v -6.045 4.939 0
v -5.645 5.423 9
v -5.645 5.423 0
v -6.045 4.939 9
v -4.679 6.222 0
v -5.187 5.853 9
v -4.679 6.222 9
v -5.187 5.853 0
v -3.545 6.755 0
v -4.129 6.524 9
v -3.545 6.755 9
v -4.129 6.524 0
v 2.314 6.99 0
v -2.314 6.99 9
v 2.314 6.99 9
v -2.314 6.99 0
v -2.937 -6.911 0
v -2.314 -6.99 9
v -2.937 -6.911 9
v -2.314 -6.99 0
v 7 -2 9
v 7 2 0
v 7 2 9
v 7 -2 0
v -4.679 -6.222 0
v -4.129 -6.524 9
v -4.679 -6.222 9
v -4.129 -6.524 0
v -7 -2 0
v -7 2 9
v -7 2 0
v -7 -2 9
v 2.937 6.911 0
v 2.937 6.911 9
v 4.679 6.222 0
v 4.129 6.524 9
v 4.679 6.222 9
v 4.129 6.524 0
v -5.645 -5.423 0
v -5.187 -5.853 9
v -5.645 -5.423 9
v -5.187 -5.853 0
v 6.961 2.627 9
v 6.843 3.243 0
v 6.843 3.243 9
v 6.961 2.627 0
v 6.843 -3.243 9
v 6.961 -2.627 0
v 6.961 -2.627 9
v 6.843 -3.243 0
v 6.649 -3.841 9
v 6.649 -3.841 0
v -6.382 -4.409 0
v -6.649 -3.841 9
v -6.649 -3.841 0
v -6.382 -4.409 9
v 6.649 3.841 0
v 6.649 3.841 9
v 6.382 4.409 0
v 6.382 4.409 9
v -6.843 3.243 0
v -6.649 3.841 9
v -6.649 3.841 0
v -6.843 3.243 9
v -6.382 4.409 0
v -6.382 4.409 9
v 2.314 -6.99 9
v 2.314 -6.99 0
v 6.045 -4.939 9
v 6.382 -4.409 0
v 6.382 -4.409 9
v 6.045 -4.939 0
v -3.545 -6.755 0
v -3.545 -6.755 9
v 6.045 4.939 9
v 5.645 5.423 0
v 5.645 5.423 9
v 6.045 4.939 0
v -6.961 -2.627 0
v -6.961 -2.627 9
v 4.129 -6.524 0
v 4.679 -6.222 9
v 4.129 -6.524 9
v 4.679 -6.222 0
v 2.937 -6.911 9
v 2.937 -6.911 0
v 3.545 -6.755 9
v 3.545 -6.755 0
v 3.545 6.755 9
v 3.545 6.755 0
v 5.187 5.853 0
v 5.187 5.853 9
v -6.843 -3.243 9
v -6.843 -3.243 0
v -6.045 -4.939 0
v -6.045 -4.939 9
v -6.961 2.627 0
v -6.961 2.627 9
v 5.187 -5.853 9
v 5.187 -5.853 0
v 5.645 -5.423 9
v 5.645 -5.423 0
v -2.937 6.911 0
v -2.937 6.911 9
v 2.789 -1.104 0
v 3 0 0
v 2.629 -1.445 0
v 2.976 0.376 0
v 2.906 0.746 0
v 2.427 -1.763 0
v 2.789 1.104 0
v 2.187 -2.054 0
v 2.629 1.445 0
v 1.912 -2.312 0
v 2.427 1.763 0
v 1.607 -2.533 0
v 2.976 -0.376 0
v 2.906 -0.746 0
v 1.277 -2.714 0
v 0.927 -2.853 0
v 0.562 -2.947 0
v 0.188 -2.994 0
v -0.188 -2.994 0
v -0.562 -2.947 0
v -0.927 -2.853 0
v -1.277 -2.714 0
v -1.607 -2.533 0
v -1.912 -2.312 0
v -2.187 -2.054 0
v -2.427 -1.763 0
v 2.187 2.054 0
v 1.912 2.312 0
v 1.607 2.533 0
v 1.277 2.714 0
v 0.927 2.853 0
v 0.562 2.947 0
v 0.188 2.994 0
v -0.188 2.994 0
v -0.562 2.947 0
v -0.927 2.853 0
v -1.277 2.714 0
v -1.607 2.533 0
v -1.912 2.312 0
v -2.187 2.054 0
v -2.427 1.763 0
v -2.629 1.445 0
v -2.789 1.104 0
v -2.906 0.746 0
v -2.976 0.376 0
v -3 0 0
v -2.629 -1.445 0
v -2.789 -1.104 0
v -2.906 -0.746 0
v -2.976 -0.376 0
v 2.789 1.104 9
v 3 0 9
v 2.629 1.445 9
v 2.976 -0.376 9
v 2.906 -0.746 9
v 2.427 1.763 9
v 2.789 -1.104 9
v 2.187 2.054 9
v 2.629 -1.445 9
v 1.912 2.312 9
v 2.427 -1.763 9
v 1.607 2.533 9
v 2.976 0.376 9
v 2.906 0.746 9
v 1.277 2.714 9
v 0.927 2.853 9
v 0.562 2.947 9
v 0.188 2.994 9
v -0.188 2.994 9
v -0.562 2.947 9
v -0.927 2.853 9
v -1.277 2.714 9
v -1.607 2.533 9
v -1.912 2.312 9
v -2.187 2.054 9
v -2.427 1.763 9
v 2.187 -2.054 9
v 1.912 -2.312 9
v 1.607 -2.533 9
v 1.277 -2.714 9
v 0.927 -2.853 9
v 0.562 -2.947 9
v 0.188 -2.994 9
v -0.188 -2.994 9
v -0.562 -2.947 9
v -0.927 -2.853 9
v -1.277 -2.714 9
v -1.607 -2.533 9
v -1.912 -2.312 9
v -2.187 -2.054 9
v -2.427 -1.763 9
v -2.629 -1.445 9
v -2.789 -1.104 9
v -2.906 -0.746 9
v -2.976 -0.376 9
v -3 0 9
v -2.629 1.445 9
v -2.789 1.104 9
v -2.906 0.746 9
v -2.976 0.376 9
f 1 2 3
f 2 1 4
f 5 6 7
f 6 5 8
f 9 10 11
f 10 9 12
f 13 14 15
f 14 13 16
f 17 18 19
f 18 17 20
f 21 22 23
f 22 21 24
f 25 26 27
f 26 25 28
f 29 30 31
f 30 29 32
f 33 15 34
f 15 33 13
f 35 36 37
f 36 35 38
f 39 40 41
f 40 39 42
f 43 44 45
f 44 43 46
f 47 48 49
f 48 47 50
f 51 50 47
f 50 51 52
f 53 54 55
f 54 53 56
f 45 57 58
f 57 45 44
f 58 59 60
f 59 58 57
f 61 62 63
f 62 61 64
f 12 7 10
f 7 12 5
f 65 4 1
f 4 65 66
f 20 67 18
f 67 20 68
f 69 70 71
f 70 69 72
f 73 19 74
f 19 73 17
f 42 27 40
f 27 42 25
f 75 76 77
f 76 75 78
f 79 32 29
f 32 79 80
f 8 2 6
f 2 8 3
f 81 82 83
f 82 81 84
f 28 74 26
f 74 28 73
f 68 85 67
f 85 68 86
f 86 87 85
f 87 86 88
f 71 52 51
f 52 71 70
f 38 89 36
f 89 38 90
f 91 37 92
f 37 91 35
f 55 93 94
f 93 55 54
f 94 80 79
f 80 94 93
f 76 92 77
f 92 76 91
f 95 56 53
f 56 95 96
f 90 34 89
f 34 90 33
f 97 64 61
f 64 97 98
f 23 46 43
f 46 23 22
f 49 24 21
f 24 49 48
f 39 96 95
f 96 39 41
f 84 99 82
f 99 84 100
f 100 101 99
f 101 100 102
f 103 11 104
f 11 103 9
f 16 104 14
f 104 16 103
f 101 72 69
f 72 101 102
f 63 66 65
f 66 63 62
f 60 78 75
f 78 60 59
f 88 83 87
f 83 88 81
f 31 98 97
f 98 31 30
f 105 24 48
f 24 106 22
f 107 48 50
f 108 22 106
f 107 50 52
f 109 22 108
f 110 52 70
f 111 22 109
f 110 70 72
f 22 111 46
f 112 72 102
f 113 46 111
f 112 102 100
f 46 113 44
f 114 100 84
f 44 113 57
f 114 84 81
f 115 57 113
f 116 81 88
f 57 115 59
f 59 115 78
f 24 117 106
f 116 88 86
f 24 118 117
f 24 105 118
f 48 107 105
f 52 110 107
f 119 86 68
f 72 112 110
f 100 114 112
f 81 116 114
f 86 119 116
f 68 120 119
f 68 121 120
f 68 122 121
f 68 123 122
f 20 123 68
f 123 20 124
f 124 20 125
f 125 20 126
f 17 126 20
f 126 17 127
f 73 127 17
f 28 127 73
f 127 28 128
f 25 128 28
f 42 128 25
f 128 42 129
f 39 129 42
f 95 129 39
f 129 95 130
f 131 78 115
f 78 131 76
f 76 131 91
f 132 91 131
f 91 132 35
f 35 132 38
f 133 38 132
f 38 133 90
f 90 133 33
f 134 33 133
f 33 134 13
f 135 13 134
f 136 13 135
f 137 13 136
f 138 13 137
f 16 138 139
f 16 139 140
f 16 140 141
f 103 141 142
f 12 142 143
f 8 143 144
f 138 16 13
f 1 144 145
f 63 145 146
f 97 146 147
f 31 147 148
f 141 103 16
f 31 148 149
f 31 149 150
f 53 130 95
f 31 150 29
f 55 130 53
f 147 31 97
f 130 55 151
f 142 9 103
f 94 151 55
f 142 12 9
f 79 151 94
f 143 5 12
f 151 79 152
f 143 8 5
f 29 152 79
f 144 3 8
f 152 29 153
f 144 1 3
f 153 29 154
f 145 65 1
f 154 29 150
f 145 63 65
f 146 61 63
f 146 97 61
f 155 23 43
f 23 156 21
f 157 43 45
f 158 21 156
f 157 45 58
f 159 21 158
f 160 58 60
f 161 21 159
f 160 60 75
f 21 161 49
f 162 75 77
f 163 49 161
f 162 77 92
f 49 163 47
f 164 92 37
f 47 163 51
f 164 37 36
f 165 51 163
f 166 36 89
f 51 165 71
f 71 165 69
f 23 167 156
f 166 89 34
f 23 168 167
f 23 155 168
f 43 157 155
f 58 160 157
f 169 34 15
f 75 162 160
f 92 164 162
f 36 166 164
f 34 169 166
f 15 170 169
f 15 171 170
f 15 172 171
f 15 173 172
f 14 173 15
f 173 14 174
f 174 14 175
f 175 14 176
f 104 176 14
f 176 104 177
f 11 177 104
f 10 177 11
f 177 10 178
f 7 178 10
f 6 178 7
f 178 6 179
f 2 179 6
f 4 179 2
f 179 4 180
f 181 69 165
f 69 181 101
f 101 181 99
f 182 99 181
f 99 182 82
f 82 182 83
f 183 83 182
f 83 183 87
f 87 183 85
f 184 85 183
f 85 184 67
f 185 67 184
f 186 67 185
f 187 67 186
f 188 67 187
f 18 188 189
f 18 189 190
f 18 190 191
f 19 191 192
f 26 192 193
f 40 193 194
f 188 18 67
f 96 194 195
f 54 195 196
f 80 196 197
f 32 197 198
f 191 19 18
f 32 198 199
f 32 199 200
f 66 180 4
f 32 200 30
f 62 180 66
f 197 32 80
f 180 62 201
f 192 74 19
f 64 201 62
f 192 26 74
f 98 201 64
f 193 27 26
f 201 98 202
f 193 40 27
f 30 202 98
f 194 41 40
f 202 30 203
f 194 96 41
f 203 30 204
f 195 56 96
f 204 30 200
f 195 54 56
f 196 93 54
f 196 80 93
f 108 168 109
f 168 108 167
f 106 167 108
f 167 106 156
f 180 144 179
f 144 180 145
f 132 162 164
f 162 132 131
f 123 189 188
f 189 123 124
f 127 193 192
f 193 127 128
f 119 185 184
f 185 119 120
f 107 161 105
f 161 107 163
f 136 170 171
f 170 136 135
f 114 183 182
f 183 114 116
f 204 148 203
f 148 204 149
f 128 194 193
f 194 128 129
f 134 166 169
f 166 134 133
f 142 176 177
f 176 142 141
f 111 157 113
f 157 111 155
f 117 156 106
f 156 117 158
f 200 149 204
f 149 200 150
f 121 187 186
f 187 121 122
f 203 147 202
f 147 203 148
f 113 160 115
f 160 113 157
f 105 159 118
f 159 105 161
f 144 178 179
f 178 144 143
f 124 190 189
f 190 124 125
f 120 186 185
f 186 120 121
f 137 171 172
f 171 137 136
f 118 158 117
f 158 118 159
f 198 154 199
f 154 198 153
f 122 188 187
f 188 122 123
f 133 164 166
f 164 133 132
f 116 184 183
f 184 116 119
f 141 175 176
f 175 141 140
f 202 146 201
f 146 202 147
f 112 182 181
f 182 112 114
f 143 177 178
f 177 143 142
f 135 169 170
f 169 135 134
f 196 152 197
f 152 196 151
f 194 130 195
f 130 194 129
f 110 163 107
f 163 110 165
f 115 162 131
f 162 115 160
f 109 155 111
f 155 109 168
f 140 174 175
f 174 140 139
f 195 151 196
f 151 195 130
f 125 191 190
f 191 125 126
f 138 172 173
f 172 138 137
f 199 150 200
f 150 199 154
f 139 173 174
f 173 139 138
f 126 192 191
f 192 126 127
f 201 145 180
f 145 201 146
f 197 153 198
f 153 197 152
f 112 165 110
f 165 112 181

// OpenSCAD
// Generated by SolidPython 1.1.3 on 2023-03-12 22:43:45
$fn = 50;


difference() {
	union() {
		translate(v = [0, 0, 0]) {
			rotate(a = [0, 0, 0]) {
				hull() {
					translate(v = [-2.0000000000, 2.0000000000, 0]) {
						rotate(a = [0, 0, 0]) {
							translate(v = [0, 0, 0]) {
								rotate(a = [0, 0, 0]) {
									cylinder(h = 9, r = 5);
								}
							}
						}
					}
					translate(v = [2.0000000000, 2.0000000000, 0]) {
						rotate(a = [0, 0, 0]) {
							translate(v = [0, 0, 0]) {
								rotate(a = [0, 0, 0]) {
									cylinder(h = 9, r = 5);
								}
							}
						}
					}
					translate(v = [-2.0000000000, -2.0000000000, 0]) {
						rotate(a = [0, 0, 0]) {
							translate(v = [0, 0, 0]) {
								rotate(a = [0, 0, 0]) {
									cylinder(h = 9, r = 5);
								}
							}
						}
					}
					translate(v = [2.0000000000, -2.0000000000, 0]) {
						rotate(a = [0, 0, 0]) {
							translate(v = [0, 0, 0]) {
								rotate(a = [0, 0, 0]) {
									cylinder(h = 9, r = 5);
								}
							}
						}
					}
				}
			}
		}
	}
	union() {
		translate(v = [0.0000000000, 0.0000000000, 0]) {
			rotate(a = [0, 0, 0]) {
				translate(v = [0, 0, -50]) {
					rotate(a = [0, 0, 0]) {
						cylinder(h = 100, r = 3.0000000000);
					}
				}
			}
		}
	}
}
/***********************************************
*********      SolidPython code:      **********
************************************************
 
from solid import *
import os
import subprocess

import oomB

import opsc_library_gen

mode = "laser"
#mode = "3d_print"

defined_objects = {}

radius_dict = {}
countersunk_dict = {}


def set_mode(m):
    global mode
    mode = m
    radius_dict['M6'] = 6.5/2
    radius_dict['M3'] = 3.3/2
    if mode == "laser":
        radius_dict['M6'] = 6/2
        radius_dict['M3'] = 3/2

    countersunk_dict['M3'] = {}
    countersunk_dict['M3']['little_rad'] = radius_dict['M3']
    countersunk_dict['M3']['big_rad'] = (5.5+0.6)/2
    if mode == "laser":
        countersunk_dict['M3']['big_rad'] = (4.75+0.6)/2
        countersunk_dict['M3']['little_rad'] = (4.75+0.6)/2

    countersunk_dict['M3']['height'] = 1.7


def opsc_make_object(filename, objects, save_type="none",resolution=50, layers = 1, tilediff = 200, mode="laser", overwrite=True):
    if overwrite or not os.path.exists(filename):
        set_mode(mode)
        save_type = save_type.lower()
        os.makedirs(os.path.dirname(filename), exist_ok=True)
        final_object = opsc_get_object(objects, mode = mode)
        # Save the final object to the specified filename    
        scad_render_to_file(final_object, filename, file_header='$fn = %s;' % resolution, include_orig_code=True)
        if mode == "laser":
            filename_laser = filename.replace(".scad","-flat.scad")
            scad_render_to_file(getLaser(final_object, layers=layers, tilediff=tilediff), filename_laser, file_header='$fn = %s;' % resolution, include_orig_code=True)
            if save_type == "all":
                saveToAll(filename_laser)
            elif save_type == "dxf":
                saveToDxf(filename_laser)
        if save_type == "all":
            saveToAll(filename)
        elif save_type == "dxf":
            saveToDxf(filename)


def opsc_get_object(objects, mode = "laser"):
    # Create the solidpython objects only include the positive objects and if they don't have inclusion or their inclusion is either all or mode
    # Initialize an empty list to store the results
    positive_objects = []

    # Iterate over the "objects" list
    for obj in objects:
        # Check if the current object has a "type" key with a value of "positive"
        if obj['type'] == 'positive':
            # Check if the current object has an "inclusion" key and its value matches "mode",
            # or if the current object does not have an "inclusion" key at all
            if not 'inclusion' in obj or obj['inclusion'] == "all" or obj['inclusion'] == mode:
                # Call the "get_opsc_item" function with the current object as an argument
                opsc_item = get_opsc_item(obj)
                # Add the result to the "positive_objects" list
                positive_objects.append(opsc_item)
# Initialize an empty list to store the results
    negative_objects = []

    # Iterate over the "objects" list
    for obj in objects:
        # Check if the current object has a "type" key with a value of "negative"
        if obj['type'] == 'negative':
            # Check if the current object has an "inclusion" key and its value matches "mode",
            # or if the current object does not have an "inclusion" key at all
            if not 'inclusion' in obj or obj['inclusion'] == "all" or obj['inclusion'] == mode:
                # Call the "get_opsc_item" function with the current object as an argument
                opsc_item = get_opsc_item(obj)
                # Add the result to the "negative_objects" list
                negative_objects.append(opsc_item)
    
    #positive_objects = [get_opsc_item(obj) for obj in objects if obj['type'] == 'positive']
    #negative_objects = [get_opsc_item(obj) for obj in objects if obj['type'] == 'negative']
    # Union the positive objects
    positive_object = union()(*positive_objects)
    # Union the negative objects
    negative_object = union()(*negative_objects)
    # Create the final object by subtracting the negative objects from the positive objects
    return difference()(positive_object, negative_object)

def get_opsc_item(params):
    # A dictionary to map radius string values to numerical values
    #radius_dict = {'small': 5, 'medium': 10, 'large': 15}
    # An array of function names for basic shapes
    basic_shapes = ['cube', 'sphere', 'cylinder']
    
    # An array of function names for other shapes
    other_shapes = ['hole', 'slot', 'rounded_rectangle', 'countersunk']
    


    # Convert radius to r if present, and remove radius from the params dictionary
    if 'radius' in params:
        if isinstance(params['radius'], str):
            # Use the radius_dict to map the radius string value to a numerical value
            params['r'] = radius_dict[params['radius']]
        else:
            params['r'] = params['radius']
        del params['radius']
    

    # Check if the object type is a basic shape
    if params['shape'] in basic_shapes:
        # Remove shape and unexpected dictionary values
        allowed_keys = {'size', 'r', 'r1', 'r2', 'd', 'h', 'rw', 'rh', 'dw', 'dh'}
        shape_params = {k: v for k, v in params.items() if k in allowed_keys}

        # Call the corresponding function for the shape parameter, using ** notation to pass the shape_params dictionary as keyword arguments
        return get_opsc_transform(params,globals()[params['shape']](**shape_params))
    
    # If the object type is not a basic shape, check if it's a defined object or one of the other shapes
    elif params['shape'] in other_shapes:
        # Call the corresponding function for the shape parameter, passing the params dictionary as an argument
        p2 = copy.deepcopy(params)
        p2["pos"] = [0,0,0]
        return get_opsc_transform(params,globals()[params['shape']](p2))
    
    # If the object is not a basic shape or a defined object, try to import it from a .scad file
    else:
        obj = defined_objects[params['shape']]
        return get_opsc_transform(params,obj)

def get_opsc_transform(params, solid_obj):
    # Rotate the object based on the 'rot' field in the params dictionary, or the 'rotX', 'rotY', and 'rotZ' fields if 'rot' is not present
    rot = params.get('rot', [])
    if rot:
        rotX, rotY, rotZ = rot
    else:
        rotX = params.get('rotX', 0)
        rotY = params.get('rotY', 0)
        rotZ = params.get('rotZ', 0)
    solid_obj = rotate([rotX, rotY, rotZ])(solid_obj)

    # Translate the object based on the 'pos' field in the params dictionary, or the 'x', 'y', and 'z' fields if 'pos' is not present
    pos = params.get('pos', [])
    if pos:
        x, y, z = pos
    else:
        x = params.get('x', 0)
        y = params.get('y', 0)
        z = params.get('z', 0)
    solid_obj = translate([x, y, z])(solid_obj)
    return solid_obj


import random

def opsc_easy_array(type, shape, repeats, pos_start, shift_arr, **kwargs):
    for i in range(0,3):
        repeats.append(1)
        pos_start.append(0)
        shift_arr.append(0)
    return_objects = []

    for x in range(0,repeats[0]):
        for y in range(0,repeats[1]):
            for z in range(0,repeats[2]):
                return_objects.append(opsc_easy(type, shape, pos=[pos_start[0]+x*shift_arr[0],pos_start[1]+y*shift_arr[1],pos_start[2]+z*shift_arr[2]], **kwargs))
    return return_objects                



def opsc_easy(type, shape, **kwargs):
    obj = {
        'type': type,
        'shape': shape
    }
    for param in ['size', 'r', 'r1', 'r2', 'd', 'h', 'rw', 'rh', 'dw', 'dh', 'pos', 'x', 'y', 'z', 'rot', 'rotX', 'rotY', 'rotZ', "w", "inclusion"]:
        if param in kwargs:
            obj[param] = kwargs[param]
    return obj

def hole(params):
    p2 = copy.deepcopy(params)  
    # Check if the radius is a string and replace it with the corresponding value from the dictionary
    if isinstance(p2['r'], str):
        p2['r'] = radius_dict[p2['r']]
    
    # Set the height to 100 if not specified
    if 'h' not in p2:
        p2['h'] = 100
        p2["pos"] = [0,0,-50]
    p2["center"] = True
    # Create the cylinder object
    p2["shape"] = "cylinder"
    p2["type"] = "positive"

    return get_opsc_item(p2)

import copy

def countersunk(params):
    p2 = copy.deepcopy(params)
    counter_rad = p2['r']
    p2['r'] = radius_dict[p2['r']]
    hp = copy.deepcopy(p2)
    hp["type"] = "positive"
    hp["shape"] = "hole"
    del hp["rot"]
    hol = get_opsc_item(hp)
    
    cp = copy.deepcopy(p2)
    cp["h"] = countersunk_dict[counter_rad]["height"]
    cp["r2"] = countersunk_dict[counter_rad]["little_rad"]
    cp["r1"] = countersunk_dict[counter_rad]["big_rad"]
    del cp["r"]
    del cp["rot"]
    cp["type"] = "positive"
    cp["shape"] = "cylinder"
    cp["pos"] = [0,0,0]

    top = get_opsc_item(cp)
    return union()(hol,top)



def slot(params):  
    p2 = copy.deepcopy(params) 
    if isinstance(p2['r'], str):
        p2['r'] = radius_dict[p2['r']]
    p2["type"] = "positive"
    p2["shape"] = "hole"
    del p2["rot"]
    p2["pos"] = [0,0,0]
    left = copy.deepcopy(p2)
    right = copy.deepcopy(p2)
    left["pos"][0] = p2["w"] / 2 - p2["r"] 
    
    right["pos"][0] = -p2["w"] / 2 + p2["r"] 
    pass
    leftObj = get_opsc_item(left)
    rightObj = get_opsc_item(right)
    return hull()(leftObj, rightObj)

def rounded_rectangle(params):   
    p2 = copy.deepcopy(params) 
    p2["h"] = p2["size"][2]
    p2["pos"] = p2.get("pos", [0, 0, 0]) 
    p2["type"] = "positive"
    p2["shape"] = "hole"
    p2["pos"] = [0,0,0]
    
    if 'rot' in p2:
        del p2["rot"]   
    if 'r' not in p2:
        p2["r"] = 5 
    tl = copy.deepcopy(p2)
    tr = copy.deepcopy(p2)
    bl = copy.deepcopy(p2)
    br = copy.deepcopy(p2)
    tl["pos"][0] = -(p2["size"][0] - p2["r"]*2)/2
    tl["pos"][1] = (p2["size"][1] - p2["r"]*2)/2
    tr["pos"][0] = (p2["size"][0] - p2["r"]*2)/2
    tr["pos"][1] = (p2["size"][1] - p2["r"]*2)/2
    bl["pos"][0] = -(p2["size"][0] - p2["r"]*2)/2
    bl["pos"][1] = -(p2["size"][1] - p2["r"]*2)/2
    br["pos"][0] = (p2["size"][0] - p2["r"]*2)/2
    br["pos"][1] = -(p2["size"][1] - p2["r"]*2)/2
    del tl["size"]
    del tr["size"]
    del bl["size"]
    del br["size"]
    tlo = get_opsc_item(tl)
    tro = get_opsc_item(tr)
    blo = get_opsc_item(bl)
    bro = get_opsc_item(br)    
    return hull()(tlo, tro, blo, bro)



def import_scad_object(filename):
    # Import the .scad file and convert it to a solidpython object
    #filename = "parts"
    obj = import_scad(filename)
    return obj.main()
    


import os
import solid as solidpython

# A dictionary to store the defined objects


def load_scad_objects():
    opsc_library_gen.gen_library(defined_objects)

import random

def test(num_objects):
    objects = []
    for i in range(num_objects):
        # Choose a random shape
        #shape = random.choice(['cube', 'sphere', 'cylinder', 'hole', 'slot', "rounded_rectangle"])
        shape = random.choice(["rounded_rectangle"])

        # Choose a random type
        type = random.choice(['positive', 'negative'])
        
        # Create an empty object dictionary
        obj = {'shape': shape, 'type': type}
        
        # Set shape-specific parameters
        if obj['shape'] in ['cube']:
            obj['size'] =  [random.uniform(5, 15), random.uniform(5, 15), random.uniform(5, 15)]
        if obj['shape'] in ['rounded_rectangle']:
            obj['size'] =  [random.uniform(5, 15), random.uniform(5, 15), random.uniform(5, 15)]
            obj['r'] = random.uniform(0.5, 5)
        elif obj['shape'] == 'sphere':
            obj['r'] = random.uniform(5, 15)
        elif obj['shape'] in ['cylinder', 'hole']:
            obj['r'] = random.uniform(0.5, 5)
            obj['h'] = random.uniform(5, 15)
        elif obj['shape'] == 'slot':
            obj['r'] = random.uniform(0.5, 5)
            obj['h'] = random.uniform(5, 15)
            obj['w'] = random.uniform(5, 15)
        
        # Set a random position and rotation
        obj['pos'] = [random.uniform(-20, 20), random.uniform(-20, 20), random.uniform(-20, 20)]
        obj['rot'] = [random.uniform(-180, 180), random.uniform(-180, 180), random.uniform(-180, 180)]
        
        # Add the object to the list
        objects.append(obj)
    return objects

####### old file saving
def saveToAll(fileIn):
    saveToDxf(fileIn)
    saveToPng(fileIn)
    saveToStl(fileIn)
    saveToSvg(fileIn)

def saveToDxf(fileIn, fileOut="", copy_to_laser=True):
    if fileOut == "":
        fileOut = fileIn.replace(".scad",".dxf")
    saveToFile(fileIn, fileOut)


    
def saveToPng(fileIn, fileOut="",extra="--render"):
    if fileOut == "":
        fileOut = fileIn.replace(".scad",".png")
    saveToFile(fileIn, fileOut)

def saveToStl(fileIn, fileOut=""):
    if fileOut == "":
        fileOut = fileIn.replace(".scad",".stl")
    saveToFile(fileIn, fileOut)
    
def saveToSvg(fileIn, fileOut=""):
    if fileOut == "":
        fileOut = fileIn.replace(".scad",".svg")
    saveToFile(fileIn, fileOut)

def saveToFile(fileIn, fileOut,extra=""):
    #extra = extra + " --colorscheme Tomorrow"

    launchStr = 'openscad -o "' + fileOut + '"' + extra + ' "' + fileIn + '"'
    if ".png" in fileOut:
        launchStr = launchStr + " --render"
    print("            saveToFile launch string: " + launchStr)
    subprocess.run(launchStr)
    x=0

def getLaser(final_object,start=1.5,layers=1,thickness=3,tilediff=200):
        rv= []

        for x in range(layers):
            rv.append(translate([0,x*tilediff,0])(
                    projection()(
                        intersection()(translate([-500,-500,start+x*thickness])(cube(size=[1000,1000,0.1])),
                            final_object
                        )
                    )
            )
            )
            
        return union()(rv)

set_mode("laser")
load_scad_objects() 
 
************************************************/
